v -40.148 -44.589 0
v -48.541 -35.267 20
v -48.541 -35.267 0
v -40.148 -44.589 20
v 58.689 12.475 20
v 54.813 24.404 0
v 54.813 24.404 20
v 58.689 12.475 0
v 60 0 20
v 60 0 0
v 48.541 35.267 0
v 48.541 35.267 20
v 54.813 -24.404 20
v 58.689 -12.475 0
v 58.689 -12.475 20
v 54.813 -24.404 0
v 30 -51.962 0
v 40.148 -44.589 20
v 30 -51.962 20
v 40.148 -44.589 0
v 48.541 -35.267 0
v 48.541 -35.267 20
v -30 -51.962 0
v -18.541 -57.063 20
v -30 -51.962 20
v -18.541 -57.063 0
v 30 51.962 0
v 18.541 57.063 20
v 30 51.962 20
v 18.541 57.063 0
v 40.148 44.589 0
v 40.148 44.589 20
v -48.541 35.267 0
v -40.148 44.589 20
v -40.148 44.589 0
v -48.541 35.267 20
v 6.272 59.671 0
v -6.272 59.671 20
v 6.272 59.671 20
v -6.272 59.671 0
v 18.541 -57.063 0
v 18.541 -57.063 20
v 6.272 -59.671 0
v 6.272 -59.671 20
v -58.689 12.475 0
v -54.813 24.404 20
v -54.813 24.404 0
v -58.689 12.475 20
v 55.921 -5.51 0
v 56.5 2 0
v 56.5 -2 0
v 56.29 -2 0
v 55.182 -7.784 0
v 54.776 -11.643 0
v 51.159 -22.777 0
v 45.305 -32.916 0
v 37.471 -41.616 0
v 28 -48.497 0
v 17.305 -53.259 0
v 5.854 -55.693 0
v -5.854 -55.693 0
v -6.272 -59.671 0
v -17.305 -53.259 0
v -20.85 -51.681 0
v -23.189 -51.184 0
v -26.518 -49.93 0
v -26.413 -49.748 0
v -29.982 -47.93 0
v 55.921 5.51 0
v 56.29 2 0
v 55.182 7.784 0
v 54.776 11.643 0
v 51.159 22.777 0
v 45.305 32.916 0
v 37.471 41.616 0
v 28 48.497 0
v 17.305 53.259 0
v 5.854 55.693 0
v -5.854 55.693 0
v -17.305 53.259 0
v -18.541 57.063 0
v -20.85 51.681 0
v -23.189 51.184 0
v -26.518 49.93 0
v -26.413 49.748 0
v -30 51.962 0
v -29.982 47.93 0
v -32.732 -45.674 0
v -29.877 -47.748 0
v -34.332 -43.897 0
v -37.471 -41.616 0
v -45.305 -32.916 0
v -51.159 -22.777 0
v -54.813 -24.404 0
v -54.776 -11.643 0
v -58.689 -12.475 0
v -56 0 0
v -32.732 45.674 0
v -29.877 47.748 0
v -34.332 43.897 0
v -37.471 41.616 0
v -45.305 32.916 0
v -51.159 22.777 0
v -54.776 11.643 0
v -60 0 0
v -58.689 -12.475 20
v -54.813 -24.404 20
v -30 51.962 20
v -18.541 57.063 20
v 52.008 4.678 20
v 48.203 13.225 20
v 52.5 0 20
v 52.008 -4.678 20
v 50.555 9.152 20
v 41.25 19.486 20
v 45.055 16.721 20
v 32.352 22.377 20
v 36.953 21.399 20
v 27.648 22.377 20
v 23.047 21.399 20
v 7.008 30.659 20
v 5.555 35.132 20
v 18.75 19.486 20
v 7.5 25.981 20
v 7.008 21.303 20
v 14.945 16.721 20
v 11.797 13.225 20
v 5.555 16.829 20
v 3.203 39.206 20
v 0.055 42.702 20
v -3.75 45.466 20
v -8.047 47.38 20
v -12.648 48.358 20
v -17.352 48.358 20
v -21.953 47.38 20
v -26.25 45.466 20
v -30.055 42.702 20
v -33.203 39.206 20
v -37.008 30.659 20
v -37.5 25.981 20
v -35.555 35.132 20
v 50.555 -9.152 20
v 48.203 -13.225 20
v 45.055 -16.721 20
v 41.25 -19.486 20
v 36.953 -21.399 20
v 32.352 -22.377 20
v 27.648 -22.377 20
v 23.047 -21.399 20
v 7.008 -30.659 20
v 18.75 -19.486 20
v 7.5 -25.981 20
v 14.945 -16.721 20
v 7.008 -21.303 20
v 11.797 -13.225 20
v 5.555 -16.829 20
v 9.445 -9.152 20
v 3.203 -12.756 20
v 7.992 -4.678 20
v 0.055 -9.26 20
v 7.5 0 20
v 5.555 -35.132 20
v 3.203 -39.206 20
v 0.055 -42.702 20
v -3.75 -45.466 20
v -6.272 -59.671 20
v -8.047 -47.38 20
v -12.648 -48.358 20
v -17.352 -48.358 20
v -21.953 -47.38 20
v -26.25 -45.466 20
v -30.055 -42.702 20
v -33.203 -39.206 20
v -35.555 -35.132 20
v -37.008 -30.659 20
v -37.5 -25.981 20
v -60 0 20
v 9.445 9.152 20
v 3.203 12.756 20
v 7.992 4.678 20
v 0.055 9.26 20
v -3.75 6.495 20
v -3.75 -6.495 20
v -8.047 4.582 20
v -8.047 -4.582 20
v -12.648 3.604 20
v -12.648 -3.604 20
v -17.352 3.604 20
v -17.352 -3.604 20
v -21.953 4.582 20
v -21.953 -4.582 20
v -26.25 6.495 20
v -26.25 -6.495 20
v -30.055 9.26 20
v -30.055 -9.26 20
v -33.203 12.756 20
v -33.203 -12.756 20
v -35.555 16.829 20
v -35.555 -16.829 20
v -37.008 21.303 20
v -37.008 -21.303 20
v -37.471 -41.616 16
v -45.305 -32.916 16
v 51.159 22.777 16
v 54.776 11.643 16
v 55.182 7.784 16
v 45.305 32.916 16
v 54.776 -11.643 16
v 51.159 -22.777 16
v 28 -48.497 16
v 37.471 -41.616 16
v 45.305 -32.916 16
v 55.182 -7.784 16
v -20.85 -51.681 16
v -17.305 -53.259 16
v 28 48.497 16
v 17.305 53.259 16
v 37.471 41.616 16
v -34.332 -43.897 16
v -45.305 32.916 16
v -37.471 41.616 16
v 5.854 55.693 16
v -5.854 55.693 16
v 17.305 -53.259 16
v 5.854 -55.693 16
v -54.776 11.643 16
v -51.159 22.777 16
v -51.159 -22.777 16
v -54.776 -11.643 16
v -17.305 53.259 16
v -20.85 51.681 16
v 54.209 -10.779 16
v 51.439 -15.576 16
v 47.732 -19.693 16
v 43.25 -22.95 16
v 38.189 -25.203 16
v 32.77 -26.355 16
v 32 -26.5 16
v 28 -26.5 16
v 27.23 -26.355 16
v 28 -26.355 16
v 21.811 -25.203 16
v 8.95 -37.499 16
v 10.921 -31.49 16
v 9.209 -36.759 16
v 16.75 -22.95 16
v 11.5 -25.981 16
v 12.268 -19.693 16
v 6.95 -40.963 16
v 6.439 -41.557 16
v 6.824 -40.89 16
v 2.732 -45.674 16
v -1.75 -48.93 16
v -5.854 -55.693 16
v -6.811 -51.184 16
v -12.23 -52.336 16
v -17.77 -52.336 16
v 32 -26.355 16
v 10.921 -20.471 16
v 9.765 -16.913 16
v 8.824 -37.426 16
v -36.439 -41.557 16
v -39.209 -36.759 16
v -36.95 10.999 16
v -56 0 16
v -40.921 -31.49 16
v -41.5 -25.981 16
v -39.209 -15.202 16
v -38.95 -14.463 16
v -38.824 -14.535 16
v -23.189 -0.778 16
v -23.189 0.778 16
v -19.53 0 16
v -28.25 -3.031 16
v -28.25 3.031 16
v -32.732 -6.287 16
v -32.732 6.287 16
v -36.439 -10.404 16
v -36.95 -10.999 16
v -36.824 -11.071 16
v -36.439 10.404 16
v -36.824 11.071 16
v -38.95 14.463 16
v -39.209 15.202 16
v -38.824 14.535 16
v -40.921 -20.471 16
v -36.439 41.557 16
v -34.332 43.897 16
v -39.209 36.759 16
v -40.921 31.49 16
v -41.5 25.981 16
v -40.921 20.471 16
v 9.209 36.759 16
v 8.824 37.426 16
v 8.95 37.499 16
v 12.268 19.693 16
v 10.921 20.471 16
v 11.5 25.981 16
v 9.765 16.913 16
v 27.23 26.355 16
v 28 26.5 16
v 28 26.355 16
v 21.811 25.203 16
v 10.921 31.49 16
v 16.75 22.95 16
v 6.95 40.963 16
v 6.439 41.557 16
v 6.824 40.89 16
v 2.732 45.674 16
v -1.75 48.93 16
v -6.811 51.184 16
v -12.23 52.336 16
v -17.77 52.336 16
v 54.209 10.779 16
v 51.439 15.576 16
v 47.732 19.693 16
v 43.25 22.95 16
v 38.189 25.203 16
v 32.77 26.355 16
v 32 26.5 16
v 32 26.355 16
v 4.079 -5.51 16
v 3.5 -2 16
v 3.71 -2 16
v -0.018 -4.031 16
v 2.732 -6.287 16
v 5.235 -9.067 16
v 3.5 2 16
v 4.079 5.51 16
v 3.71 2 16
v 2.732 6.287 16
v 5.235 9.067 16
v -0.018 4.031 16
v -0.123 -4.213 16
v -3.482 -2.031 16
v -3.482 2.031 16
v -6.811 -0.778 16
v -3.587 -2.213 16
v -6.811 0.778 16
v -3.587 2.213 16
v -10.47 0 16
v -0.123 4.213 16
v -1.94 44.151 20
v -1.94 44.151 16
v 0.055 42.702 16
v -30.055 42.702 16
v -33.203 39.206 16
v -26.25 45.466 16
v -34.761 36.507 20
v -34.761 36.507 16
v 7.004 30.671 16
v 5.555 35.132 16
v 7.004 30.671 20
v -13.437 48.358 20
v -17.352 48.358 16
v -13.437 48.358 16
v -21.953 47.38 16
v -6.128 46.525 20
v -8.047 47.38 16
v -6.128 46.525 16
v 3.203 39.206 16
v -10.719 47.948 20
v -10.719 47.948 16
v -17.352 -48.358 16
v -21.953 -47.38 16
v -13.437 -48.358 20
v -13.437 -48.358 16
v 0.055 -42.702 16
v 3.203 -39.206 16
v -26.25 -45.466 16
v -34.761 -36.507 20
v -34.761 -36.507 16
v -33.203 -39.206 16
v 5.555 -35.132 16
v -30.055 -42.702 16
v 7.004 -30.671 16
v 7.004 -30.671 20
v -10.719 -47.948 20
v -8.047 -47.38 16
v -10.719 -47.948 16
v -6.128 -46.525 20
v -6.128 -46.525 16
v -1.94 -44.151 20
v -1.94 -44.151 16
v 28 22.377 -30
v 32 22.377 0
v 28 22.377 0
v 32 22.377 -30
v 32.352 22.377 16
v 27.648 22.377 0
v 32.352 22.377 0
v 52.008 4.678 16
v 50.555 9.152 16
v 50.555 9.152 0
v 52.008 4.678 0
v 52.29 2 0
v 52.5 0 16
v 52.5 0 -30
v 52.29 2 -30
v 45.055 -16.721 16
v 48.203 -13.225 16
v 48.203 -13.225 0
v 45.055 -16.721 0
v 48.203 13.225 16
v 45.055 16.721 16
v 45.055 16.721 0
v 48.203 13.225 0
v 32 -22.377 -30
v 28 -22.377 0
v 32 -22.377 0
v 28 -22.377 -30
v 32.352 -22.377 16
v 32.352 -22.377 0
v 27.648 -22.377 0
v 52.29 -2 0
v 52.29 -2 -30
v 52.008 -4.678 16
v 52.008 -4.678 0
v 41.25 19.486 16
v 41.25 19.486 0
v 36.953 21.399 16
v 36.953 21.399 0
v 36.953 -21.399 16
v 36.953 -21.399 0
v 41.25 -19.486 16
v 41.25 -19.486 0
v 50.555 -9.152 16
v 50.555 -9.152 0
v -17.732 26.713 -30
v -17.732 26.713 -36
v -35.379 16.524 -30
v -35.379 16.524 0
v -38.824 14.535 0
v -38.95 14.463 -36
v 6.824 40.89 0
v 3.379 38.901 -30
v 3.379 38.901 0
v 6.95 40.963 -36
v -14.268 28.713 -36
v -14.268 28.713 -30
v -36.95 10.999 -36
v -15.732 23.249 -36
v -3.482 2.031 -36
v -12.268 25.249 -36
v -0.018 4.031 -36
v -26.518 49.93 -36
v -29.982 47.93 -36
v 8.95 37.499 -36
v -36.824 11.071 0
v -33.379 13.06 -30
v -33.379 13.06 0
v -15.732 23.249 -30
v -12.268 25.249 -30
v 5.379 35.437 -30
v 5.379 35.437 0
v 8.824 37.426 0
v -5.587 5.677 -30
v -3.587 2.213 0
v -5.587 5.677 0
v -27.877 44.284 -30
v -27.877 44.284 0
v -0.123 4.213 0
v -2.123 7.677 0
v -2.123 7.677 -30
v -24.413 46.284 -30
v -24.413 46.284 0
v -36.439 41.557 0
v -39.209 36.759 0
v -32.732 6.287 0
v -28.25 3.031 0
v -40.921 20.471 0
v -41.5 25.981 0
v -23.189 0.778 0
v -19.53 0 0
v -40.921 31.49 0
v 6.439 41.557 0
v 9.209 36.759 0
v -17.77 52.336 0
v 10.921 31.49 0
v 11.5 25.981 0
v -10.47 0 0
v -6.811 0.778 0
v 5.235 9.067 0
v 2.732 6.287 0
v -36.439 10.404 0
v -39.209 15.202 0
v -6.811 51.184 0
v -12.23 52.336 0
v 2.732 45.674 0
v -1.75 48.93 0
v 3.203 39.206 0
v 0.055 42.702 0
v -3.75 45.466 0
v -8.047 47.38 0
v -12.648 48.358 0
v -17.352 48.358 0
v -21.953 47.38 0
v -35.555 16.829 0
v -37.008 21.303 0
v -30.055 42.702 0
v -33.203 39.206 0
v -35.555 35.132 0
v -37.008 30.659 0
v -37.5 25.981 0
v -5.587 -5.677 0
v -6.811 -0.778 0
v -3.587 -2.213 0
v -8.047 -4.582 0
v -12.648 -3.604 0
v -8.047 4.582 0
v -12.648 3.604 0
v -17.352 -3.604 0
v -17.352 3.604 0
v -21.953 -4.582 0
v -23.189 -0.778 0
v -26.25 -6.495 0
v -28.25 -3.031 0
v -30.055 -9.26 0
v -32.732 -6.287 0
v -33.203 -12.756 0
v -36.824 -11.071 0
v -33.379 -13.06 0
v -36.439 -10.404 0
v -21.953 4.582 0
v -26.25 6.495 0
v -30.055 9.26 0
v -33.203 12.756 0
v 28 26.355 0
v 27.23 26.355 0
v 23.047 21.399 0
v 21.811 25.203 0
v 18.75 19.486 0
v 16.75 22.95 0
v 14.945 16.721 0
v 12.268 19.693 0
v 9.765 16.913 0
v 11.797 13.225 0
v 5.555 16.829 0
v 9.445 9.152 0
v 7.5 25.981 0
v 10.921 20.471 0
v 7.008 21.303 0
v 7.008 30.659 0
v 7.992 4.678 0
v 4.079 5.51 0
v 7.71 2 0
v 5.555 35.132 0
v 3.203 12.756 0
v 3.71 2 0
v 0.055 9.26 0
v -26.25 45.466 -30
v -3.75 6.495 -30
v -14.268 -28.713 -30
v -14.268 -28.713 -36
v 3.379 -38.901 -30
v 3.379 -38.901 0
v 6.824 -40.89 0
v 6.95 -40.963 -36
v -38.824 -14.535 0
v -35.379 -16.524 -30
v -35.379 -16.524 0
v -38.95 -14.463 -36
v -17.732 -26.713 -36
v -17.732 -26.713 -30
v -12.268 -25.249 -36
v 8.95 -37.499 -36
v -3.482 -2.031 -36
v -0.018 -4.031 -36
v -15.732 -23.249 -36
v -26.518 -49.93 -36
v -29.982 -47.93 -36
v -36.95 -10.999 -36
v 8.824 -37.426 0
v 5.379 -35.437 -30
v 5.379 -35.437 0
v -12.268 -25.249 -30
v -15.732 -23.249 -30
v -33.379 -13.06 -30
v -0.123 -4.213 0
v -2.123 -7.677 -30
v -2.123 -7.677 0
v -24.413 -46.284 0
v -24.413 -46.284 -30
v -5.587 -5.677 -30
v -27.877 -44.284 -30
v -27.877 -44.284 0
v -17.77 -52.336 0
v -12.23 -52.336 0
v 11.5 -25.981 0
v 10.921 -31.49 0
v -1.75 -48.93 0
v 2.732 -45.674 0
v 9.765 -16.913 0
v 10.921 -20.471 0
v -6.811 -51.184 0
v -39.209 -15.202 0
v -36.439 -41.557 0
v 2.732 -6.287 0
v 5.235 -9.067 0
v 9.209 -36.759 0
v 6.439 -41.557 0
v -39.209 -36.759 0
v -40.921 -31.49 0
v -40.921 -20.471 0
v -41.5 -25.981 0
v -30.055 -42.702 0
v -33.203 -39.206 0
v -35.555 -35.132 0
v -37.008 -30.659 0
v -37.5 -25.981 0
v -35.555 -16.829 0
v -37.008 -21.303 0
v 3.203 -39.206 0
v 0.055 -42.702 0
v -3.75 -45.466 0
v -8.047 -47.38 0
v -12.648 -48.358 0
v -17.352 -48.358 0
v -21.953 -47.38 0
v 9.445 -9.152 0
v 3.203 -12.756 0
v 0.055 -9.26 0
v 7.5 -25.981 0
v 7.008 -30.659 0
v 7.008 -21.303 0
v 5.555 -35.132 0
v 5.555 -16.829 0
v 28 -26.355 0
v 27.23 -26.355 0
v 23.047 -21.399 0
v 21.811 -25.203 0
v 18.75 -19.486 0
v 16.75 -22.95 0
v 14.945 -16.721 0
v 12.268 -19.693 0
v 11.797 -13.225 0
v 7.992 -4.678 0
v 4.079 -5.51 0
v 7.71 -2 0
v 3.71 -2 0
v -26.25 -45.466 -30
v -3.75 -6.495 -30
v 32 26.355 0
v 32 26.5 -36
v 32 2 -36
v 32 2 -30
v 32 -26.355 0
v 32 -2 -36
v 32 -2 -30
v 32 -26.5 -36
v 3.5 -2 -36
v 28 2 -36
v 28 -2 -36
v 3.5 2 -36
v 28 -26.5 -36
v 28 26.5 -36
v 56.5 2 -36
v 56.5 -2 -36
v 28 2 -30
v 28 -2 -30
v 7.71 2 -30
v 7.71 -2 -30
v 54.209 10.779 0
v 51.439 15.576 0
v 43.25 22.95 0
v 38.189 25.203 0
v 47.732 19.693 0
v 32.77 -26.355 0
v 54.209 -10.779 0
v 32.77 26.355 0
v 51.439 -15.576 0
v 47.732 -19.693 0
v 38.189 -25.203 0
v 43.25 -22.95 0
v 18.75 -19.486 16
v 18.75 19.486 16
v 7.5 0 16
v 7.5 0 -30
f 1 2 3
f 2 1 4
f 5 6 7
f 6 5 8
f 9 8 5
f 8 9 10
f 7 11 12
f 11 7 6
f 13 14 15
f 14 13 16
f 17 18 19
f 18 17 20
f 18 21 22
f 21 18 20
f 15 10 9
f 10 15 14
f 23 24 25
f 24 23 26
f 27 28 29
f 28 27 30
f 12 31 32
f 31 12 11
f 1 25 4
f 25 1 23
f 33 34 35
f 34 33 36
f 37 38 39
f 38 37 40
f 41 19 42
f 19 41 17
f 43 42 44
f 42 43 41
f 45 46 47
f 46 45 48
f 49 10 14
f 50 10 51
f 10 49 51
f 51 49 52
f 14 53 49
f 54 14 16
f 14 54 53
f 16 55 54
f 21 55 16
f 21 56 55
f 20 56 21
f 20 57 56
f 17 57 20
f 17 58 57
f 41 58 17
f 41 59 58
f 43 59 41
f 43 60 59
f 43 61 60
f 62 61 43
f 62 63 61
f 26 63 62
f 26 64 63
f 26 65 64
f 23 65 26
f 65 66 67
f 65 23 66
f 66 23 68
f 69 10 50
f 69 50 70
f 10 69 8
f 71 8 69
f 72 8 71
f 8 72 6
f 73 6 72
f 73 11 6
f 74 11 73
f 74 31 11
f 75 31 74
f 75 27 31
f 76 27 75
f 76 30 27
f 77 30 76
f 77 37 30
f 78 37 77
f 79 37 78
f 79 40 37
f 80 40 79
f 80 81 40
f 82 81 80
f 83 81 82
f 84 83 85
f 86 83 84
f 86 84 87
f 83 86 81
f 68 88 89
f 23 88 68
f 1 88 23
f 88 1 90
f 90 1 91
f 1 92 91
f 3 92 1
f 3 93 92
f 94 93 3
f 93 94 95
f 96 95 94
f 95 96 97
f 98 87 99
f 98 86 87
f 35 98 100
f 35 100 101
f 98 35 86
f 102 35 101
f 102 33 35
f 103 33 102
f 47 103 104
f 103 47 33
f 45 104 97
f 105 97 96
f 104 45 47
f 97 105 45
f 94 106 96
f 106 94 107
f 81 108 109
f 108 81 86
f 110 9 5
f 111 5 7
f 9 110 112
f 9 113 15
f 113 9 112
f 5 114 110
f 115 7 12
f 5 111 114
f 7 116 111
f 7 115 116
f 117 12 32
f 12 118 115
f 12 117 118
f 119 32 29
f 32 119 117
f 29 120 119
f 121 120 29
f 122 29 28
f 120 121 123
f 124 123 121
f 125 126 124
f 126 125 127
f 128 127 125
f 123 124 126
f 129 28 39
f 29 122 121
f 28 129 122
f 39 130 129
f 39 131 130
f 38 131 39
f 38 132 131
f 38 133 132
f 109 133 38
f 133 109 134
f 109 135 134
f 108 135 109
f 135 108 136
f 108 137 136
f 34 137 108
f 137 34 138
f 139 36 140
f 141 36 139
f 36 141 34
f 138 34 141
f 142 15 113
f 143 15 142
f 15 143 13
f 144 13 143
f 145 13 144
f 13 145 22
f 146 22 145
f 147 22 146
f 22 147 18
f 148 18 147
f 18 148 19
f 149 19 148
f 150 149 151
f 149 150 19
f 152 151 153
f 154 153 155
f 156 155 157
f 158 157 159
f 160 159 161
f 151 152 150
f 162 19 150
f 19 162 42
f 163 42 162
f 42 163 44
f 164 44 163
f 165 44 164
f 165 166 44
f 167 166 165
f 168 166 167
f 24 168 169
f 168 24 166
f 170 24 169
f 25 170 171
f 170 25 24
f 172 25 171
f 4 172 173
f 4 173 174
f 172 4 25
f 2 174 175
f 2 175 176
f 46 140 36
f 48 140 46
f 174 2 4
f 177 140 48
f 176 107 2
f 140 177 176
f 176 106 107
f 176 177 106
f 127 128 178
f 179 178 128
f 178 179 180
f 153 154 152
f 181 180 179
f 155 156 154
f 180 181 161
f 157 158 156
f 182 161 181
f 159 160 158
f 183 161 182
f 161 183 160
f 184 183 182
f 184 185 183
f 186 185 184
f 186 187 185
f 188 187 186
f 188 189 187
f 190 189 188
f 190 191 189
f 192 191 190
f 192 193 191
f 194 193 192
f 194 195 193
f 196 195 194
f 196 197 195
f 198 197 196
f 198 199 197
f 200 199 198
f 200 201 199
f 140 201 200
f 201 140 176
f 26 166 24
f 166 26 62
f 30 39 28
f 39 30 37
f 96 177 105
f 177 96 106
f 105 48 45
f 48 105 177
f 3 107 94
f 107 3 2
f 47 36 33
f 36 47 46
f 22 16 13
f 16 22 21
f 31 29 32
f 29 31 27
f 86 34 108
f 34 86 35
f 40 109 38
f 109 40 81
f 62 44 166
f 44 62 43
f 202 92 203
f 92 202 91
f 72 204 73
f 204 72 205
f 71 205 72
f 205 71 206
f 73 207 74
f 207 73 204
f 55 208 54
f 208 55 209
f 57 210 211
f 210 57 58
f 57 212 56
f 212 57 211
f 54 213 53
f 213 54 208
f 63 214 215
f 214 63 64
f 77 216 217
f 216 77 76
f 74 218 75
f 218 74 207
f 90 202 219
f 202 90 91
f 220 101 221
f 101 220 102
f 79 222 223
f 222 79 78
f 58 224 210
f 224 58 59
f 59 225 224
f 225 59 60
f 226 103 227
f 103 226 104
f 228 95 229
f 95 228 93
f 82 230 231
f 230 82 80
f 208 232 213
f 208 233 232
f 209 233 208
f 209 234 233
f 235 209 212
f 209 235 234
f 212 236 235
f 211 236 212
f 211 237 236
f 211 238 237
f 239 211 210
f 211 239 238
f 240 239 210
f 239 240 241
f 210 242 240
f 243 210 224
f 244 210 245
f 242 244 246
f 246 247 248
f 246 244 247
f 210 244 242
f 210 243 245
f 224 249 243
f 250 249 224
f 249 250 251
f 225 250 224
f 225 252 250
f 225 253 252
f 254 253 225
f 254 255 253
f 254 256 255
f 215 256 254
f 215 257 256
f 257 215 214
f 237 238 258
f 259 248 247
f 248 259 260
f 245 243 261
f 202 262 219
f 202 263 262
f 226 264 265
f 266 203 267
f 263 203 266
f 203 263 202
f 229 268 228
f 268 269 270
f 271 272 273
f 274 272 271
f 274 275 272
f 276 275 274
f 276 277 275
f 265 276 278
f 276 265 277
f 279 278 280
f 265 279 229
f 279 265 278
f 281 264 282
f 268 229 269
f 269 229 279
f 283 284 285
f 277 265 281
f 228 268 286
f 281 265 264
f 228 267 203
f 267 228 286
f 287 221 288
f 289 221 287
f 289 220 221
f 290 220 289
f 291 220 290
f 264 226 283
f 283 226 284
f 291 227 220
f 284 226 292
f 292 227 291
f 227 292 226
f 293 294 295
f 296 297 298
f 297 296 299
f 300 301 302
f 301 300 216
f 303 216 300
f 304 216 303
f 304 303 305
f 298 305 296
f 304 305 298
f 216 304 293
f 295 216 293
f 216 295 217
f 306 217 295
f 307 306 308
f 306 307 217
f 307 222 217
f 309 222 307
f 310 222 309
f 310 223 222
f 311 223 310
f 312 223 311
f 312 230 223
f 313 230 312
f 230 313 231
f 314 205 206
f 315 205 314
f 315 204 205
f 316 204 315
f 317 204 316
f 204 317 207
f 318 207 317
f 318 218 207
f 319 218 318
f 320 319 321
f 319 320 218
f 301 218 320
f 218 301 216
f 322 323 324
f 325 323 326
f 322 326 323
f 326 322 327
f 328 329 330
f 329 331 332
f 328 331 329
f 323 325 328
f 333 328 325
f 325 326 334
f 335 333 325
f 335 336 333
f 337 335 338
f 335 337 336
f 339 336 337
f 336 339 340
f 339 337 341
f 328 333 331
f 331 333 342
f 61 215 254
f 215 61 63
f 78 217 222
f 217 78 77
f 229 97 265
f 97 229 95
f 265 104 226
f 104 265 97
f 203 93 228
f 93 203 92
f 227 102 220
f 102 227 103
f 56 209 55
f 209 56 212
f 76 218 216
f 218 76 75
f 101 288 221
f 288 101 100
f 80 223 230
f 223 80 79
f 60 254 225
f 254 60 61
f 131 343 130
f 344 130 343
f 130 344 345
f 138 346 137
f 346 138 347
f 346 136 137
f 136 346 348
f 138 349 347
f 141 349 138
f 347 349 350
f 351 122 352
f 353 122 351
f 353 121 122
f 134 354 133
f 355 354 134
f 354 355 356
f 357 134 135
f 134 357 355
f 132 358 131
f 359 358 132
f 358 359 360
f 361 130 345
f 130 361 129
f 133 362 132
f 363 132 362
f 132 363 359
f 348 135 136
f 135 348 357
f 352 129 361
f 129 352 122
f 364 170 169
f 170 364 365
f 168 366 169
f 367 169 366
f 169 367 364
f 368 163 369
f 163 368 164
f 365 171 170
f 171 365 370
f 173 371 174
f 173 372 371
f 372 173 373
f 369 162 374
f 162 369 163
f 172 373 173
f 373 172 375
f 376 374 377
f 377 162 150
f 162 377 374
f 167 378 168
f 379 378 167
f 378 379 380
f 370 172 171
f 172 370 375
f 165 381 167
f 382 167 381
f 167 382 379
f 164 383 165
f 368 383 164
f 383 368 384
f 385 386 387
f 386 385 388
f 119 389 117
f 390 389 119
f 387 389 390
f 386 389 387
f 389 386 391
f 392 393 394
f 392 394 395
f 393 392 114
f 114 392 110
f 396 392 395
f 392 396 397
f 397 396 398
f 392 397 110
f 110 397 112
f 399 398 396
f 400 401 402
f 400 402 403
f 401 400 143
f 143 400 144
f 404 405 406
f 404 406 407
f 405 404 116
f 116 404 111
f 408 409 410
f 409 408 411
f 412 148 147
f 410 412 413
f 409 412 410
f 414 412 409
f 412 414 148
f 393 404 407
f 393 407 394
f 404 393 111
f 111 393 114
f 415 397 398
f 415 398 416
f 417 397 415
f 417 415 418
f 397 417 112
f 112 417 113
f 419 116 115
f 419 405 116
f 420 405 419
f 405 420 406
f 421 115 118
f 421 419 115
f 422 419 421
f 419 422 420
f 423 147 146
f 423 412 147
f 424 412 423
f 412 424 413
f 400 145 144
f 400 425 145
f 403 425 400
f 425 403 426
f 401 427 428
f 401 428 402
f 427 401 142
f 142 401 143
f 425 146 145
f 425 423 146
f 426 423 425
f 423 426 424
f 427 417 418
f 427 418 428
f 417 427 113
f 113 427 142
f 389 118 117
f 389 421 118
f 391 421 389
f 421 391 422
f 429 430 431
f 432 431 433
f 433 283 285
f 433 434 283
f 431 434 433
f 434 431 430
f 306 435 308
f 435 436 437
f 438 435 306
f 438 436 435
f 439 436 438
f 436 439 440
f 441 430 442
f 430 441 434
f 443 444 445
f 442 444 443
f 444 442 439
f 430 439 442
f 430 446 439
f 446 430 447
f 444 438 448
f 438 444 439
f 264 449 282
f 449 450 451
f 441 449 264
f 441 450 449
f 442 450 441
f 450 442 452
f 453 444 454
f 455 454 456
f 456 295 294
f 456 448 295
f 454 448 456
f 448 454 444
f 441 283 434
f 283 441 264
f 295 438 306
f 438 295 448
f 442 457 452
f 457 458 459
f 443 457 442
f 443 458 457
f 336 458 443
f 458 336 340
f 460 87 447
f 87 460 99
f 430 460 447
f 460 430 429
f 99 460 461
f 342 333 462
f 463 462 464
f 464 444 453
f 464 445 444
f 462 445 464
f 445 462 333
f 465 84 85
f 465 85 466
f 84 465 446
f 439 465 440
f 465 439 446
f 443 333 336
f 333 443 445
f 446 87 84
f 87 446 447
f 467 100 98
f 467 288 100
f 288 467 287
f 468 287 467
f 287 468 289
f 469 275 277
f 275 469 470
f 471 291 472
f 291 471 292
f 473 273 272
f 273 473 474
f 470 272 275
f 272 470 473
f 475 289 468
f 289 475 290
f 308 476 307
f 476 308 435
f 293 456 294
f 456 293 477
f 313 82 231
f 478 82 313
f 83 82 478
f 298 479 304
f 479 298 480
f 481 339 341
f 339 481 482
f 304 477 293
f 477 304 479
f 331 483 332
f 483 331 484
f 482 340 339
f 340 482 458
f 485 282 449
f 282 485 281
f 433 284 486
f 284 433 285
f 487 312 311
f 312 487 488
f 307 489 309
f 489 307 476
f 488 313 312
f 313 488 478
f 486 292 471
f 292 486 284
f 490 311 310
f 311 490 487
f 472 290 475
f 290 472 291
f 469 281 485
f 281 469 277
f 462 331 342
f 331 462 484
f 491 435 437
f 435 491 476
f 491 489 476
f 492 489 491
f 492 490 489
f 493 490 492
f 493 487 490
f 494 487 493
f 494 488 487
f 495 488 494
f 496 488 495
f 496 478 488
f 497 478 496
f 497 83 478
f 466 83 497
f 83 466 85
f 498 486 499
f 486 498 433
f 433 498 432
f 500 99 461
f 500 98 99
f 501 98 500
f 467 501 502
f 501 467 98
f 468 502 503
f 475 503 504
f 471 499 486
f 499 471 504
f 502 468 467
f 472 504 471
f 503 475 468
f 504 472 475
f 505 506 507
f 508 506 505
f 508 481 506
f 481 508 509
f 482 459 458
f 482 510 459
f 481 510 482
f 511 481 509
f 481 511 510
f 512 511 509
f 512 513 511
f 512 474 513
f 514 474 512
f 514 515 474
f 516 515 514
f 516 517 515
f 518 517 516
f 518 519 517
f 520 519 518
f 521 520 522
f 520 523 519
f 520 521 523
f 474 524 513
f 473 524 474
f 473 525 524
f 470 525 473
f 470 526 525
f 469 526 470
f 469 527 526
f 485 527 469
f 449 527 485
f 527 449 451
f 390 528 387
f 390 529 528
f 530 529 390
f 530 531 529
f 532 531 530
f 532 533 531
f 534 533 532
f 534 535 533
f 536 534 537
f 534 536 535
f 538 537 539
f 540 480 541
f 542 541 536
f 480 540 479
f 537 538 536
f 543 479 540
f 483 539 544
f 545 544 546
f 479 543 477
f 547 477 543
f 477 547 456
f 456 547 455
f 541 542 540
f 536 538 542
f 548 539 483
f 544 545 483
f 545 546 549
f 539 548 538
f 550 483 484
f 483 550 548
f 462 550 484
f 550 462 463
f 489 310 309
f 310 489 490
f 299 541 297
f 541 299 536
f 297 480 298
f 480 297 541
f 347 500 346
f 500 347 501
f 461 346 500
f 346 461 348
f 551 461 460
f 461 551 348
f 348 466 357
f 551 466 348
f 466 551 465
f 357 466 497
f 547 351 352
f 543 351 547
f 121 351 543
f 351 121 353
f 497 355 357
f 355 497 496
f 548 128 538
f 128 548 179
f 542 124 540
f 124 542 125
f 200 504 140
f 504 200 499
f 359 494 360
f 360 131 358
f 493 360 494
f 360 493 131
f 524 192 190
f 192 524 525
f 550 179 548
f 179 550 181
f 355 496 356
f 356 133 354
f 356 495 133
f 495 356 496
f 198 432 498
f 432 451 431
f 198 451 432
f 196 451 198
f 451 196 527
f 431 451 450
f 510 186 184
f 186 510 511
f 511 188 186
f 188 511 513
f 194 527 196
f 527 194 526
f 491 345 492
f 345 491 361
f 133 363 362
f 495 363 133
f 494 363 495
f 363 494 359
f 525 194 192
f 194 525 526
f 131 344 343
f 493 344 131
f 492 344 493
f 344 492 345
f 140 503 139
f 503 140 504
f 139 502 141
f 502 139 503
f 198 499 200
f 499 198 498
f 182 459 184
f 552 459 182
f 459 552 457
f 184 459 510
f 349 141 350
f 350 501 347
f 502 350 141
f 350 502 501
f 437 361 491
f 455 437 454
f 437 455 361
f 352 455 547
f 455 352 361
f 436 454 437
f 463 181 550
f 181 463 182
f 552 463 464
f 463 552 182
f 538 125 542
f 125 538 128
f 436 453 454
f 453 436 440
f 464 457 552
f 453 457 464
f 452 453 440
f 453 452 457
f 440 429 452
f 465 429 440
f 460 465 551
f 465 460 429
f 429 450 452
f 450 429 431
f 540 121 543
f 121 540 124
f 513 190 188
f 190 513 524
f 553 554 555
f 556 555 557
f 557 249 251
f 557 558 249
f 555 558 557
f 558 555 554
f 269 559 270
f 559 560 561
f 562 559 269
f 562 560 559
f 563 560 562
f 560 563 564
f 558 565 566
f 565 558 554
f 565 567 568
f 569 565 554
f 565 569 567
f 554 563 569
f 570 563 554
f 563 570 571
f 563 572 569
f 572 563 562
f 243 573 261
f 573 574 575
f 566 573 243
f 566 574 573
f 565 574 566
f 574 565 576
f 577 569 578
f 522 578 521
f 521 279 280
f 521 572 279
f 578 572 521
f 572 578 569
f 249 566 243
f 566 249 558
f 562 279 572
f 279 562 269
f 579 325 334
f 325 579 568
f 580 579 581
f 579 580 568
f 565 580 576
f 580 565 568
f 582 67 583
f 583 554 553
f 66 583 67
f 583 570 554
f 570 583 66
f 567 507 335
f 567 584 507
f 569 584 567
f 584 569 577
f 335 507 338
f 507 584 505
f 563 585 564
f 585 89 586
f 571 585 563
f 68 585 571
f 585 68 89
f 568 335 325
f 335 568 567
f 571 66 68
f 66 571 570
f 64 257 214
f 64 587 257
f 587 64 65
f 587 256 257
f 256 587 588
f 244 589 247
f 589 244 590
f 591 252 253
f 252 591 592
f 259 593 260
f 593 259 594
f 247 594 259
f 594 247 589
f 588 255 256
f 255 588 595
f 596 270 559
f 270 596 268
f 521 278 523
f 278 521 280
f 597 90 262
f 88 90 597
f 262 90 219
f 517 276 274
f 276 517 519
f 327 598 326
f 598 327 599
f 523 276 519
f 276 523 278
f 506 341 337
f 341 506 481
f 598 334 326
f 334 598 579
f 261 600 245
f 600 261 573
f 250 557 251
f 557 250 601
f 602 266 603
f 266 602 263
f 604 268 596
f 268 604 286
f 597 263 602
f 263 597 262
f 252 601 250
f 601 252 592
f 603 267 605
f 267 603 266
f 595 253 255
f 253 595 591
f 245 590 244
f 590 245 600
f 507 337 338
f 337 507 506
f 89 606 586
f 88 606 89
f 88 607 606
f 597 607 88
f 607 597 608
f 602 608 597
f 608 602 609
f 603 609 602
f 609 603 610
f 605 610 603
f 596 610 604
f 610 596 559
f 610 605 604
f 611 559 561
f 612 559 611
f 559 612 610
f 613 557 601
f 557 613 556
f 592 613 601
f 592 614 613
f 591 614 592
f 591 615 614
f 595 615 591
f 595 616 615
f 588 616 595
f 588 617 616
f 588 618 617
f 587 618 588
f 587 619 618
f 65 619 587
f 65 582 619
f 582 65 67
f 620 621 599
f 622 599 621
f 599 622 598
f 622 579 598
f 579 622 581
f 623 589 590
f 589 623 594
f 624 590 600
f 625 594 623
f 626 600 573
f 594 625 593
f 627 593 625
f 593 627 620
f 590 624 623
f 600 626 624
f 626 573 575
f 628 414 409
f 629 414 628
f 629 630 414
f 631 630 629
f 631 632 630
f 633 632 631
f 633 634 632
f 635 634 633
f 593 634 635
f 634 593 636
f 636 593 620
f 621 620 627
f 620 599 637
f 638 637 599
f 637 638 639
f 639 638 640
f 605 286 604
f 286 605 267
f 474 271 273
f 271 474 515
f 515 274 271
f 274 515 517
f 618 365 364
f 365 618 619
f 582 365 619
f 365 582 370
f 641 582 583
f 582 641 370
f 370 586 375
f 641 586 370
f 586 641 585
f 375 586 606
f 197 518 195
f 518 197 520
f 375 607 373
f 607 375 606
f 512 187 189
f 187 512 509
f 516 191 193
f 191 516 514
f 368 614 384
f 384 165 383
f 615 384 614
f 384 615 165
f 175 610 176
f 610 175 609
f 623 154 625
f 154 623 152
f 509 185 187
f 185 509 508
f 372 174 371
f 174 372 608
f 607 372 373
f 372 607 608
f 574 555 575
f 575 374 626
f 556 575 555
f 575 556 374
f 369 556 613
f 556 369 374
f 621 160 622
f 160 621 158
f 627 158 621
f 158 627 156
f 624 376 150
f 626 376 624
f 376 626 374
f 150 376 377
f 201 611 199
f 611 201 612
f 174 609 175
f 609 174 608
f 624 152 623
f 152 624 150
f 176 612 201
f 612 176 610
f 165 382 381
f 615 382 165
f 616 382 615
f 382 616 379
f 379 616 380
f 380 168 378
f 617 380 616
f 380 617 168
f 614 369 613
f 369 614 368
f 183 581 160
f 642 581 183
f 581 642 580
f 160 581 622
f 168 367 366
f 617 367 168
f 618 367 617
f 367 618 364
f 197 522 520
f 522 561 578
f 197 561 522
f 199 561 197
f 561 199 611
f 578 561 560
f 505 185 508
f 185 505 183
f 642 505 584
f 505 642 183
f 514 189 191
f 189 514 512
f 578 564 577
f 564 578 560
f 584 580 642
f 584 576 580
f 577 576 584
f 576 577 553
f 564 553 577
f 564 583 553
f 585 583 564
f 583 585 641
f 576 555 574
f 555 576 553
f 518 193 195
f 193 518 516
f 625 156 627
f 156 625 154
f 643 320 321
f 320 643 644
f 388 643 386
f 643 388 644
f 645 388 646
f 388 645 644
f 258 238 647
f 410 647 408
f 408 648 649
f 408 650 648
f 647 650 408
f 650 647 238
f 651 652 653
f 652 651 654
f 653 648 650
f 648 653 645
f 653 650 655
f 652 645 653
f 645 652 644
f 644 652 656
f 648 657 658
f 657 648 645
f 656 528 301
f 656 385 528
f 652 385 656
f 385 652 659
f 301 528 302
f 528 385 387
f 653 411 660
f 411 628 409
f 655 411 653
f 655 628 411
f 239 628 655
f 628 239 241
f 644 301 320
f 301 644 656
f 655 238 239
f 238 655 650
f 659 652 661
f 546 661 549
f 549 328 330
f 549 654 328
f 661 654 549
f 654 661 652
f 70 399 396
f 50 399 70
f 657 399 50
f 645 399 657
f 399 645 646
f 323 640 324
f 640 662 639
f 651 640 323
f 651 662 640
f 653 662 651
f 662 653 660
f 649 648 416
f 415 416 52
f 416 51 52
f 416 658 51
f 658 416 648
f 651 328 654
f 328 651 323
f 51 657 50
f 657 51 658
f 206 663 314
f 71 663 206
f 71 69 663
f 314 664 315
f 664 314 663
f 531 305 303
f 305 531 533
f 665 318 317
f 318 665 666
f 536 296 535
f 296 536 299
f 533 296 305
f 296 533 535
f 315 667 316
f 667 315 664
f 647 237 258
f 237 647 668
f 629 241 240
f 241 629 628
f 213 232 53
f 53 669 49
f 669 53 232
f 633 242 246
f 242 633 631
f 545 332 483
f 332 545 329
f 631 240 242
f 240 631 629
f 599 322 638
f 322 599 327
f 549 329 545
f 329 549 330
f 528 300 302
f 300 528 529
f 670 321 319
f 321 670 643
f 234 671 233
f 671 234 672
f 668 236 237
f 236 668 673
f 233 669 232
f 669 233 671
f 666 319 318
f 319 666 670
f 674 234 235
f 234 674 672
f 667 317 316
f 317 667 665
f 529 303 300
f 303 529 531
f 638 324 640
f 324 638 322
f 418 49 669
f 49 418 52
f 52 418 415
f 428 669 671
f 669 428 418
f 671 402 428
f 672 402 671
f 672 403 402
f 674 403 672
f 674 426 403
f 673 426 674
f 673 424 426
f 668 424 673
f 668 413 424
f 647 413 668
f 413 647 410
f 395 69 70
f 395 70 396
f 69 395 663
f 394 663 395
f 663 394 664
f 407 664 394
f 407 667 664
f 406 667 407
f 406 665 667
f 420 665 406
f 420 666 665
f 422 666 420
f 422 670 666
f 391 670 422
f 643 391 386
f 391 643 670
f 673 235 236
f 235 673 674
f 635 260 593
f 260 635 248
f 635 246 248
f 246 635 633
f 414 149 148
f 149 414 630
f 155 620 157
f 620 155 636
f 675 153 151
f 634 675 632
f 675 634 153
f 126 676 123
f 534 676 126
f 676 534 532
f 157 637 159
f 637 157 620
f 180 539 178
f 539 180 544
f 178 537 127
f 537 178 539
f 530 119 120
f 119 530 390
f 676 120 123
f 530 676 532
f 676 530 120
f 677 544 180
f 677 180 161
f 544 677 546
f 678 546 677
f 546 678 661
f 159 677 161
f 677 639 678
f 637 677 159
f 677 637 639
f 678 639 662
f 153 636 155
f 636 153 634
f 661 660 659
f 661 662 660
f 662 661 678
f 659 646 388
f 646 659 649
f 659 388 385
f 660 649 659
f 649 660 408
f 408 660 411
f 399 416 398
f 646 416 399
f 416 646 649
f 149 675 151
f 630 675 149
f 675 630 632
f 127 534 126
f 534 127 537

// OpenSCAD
//=============================================================================
// Floater.scad
//
// Holder for ultrasonic foggers, makes them float at the proper depth in a
// larger container of water.
//=============================================================================
// Written in 2017 by Patrick Barrett
//
// To the extent possible under law, the author(s) have dedicated all copyright
// and related and neighboring rights to this work to the public domain
// worldwide. This work is distributed without any warranty.
//
// See <http://creativecommons.org/publicdomain/zero/1.0/> for full dedication.
//=============================================================================

body_diameter = 120;
body_depth = 20;

wall_thickness = 4;

fogger_width = 45;
fogger_height = 30;

water_depth = 20;

// customizable variables end here

basket_depth = fogger_height + water_depth;

abit = 0.0001; //use for making overlap to get single manifold stl
alot = 10000;

module fogger_slot() {
    difference() {
        union() {
            // tangent support
            translate([0, 0, -(basket_depth/2 + wall_thickness)])
            cube([wall_thickness,
                  fogger_width + wall_thickness*2,
                  basket_depth + wall_thickness],
                 center = true);
            
            // radial support
            rotate([0,0,360 * 1/4])
            translate([0, 0, -(basket_depth/2 + wall_thickness)])
            cube([wall_thickness,
                  fogger_width + wall_thickness*2,
                  basket_depth + wall_thickness],
                 center = true);
            
            translate([0,0,-(body_depth+abit)])
            cylinder(h = body_depth, d = fogger_width + (wall_thickness * 2));
        }
    
        translate([0,0,-basket_depth + abit])
        cylinder(h = basket_depth, d = fogger_width);
    }
}

union() {
	// main body
	difference() {
		cylinder(h = body_depth, d = body_diameter);
        
		translate([0,0,-wall_thickness])
			cylinder(h = body_depth, d = body_diameter - wall_thickness*2);
        
        rotate([0,0,360* 1/3])
        translate([30,0,-alot/2])
            cylinder(h = alot, d = 45);
        
        rotate([0,0,360* 2/3])
        translate([30,0,-alot/2])
            cylinder(h = alot, d = 45);
        
        rotate([0,0,360* 3/3])
        translate([30,0,-alot/2])
            cylinder(h = alot, d = 45);
	}
    
    rotate([0,0,360* 1/3])
    translate([30,0,body_depth])
        fogger_slot();

    rotate([0,0,360* 2/3])
    translate([30,0,body_depth])
        fogger_slot();
    
    rotate([0,0,360* 3/3])
    translate([30,0,body_depth])
        fogger_slot();
}
